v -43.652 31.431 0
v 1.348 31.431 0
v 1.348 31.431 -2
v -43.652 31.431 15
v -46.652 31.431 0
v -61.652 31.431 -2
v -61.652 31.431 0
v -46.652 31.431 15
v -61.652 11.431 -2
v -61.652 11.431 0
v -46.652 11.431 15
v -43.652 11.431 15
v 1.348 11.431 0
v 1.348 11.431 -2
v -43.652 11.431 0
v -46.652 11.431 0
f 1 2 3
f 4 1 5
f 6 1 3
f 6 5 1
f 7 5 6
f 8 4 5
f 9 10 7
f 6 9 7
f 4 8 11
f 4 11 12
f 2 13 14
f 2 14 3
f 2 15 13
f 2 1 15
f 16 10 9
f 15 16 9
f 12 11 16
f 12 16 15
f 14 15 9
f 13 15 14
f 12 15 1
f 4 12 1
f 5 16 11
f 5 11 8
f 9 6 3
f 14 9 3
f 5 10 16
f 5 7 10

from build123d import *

# Parameters (mm, degrees)
F0_W     = 45
F0_H     = 20
F0_W_2   = 3
F0_W_3   = 15
F1_DEPTH = 2
F2_DEPTH = 15


with BuildPart() as f1:
    # F0 (on Top) → F1 (new body)
    with BuildSketch(Plane.XY):
        with Locations((-21.151677, 21.431452)):
            Rectangle(F0_W, F0_H)
        with Locations((-45.151677, 21.431452)):
            Rectangle(F0_W_2, F0_H)
        with Locations((-54.151677, 21.431452)):
            Rectangle(F0_W_3, F0_H)
    extrude(amount=-F1_DEPTH)

    # F0 (on Top) → F2 (join)
    with BuildSketch(Plane.XY):
        with Locations((-45.151677, 21.431452)):
            Rectangle(F0_W_2, F0_H)
    extrude(amount=F2_DEPTH)


solid = f1.part
